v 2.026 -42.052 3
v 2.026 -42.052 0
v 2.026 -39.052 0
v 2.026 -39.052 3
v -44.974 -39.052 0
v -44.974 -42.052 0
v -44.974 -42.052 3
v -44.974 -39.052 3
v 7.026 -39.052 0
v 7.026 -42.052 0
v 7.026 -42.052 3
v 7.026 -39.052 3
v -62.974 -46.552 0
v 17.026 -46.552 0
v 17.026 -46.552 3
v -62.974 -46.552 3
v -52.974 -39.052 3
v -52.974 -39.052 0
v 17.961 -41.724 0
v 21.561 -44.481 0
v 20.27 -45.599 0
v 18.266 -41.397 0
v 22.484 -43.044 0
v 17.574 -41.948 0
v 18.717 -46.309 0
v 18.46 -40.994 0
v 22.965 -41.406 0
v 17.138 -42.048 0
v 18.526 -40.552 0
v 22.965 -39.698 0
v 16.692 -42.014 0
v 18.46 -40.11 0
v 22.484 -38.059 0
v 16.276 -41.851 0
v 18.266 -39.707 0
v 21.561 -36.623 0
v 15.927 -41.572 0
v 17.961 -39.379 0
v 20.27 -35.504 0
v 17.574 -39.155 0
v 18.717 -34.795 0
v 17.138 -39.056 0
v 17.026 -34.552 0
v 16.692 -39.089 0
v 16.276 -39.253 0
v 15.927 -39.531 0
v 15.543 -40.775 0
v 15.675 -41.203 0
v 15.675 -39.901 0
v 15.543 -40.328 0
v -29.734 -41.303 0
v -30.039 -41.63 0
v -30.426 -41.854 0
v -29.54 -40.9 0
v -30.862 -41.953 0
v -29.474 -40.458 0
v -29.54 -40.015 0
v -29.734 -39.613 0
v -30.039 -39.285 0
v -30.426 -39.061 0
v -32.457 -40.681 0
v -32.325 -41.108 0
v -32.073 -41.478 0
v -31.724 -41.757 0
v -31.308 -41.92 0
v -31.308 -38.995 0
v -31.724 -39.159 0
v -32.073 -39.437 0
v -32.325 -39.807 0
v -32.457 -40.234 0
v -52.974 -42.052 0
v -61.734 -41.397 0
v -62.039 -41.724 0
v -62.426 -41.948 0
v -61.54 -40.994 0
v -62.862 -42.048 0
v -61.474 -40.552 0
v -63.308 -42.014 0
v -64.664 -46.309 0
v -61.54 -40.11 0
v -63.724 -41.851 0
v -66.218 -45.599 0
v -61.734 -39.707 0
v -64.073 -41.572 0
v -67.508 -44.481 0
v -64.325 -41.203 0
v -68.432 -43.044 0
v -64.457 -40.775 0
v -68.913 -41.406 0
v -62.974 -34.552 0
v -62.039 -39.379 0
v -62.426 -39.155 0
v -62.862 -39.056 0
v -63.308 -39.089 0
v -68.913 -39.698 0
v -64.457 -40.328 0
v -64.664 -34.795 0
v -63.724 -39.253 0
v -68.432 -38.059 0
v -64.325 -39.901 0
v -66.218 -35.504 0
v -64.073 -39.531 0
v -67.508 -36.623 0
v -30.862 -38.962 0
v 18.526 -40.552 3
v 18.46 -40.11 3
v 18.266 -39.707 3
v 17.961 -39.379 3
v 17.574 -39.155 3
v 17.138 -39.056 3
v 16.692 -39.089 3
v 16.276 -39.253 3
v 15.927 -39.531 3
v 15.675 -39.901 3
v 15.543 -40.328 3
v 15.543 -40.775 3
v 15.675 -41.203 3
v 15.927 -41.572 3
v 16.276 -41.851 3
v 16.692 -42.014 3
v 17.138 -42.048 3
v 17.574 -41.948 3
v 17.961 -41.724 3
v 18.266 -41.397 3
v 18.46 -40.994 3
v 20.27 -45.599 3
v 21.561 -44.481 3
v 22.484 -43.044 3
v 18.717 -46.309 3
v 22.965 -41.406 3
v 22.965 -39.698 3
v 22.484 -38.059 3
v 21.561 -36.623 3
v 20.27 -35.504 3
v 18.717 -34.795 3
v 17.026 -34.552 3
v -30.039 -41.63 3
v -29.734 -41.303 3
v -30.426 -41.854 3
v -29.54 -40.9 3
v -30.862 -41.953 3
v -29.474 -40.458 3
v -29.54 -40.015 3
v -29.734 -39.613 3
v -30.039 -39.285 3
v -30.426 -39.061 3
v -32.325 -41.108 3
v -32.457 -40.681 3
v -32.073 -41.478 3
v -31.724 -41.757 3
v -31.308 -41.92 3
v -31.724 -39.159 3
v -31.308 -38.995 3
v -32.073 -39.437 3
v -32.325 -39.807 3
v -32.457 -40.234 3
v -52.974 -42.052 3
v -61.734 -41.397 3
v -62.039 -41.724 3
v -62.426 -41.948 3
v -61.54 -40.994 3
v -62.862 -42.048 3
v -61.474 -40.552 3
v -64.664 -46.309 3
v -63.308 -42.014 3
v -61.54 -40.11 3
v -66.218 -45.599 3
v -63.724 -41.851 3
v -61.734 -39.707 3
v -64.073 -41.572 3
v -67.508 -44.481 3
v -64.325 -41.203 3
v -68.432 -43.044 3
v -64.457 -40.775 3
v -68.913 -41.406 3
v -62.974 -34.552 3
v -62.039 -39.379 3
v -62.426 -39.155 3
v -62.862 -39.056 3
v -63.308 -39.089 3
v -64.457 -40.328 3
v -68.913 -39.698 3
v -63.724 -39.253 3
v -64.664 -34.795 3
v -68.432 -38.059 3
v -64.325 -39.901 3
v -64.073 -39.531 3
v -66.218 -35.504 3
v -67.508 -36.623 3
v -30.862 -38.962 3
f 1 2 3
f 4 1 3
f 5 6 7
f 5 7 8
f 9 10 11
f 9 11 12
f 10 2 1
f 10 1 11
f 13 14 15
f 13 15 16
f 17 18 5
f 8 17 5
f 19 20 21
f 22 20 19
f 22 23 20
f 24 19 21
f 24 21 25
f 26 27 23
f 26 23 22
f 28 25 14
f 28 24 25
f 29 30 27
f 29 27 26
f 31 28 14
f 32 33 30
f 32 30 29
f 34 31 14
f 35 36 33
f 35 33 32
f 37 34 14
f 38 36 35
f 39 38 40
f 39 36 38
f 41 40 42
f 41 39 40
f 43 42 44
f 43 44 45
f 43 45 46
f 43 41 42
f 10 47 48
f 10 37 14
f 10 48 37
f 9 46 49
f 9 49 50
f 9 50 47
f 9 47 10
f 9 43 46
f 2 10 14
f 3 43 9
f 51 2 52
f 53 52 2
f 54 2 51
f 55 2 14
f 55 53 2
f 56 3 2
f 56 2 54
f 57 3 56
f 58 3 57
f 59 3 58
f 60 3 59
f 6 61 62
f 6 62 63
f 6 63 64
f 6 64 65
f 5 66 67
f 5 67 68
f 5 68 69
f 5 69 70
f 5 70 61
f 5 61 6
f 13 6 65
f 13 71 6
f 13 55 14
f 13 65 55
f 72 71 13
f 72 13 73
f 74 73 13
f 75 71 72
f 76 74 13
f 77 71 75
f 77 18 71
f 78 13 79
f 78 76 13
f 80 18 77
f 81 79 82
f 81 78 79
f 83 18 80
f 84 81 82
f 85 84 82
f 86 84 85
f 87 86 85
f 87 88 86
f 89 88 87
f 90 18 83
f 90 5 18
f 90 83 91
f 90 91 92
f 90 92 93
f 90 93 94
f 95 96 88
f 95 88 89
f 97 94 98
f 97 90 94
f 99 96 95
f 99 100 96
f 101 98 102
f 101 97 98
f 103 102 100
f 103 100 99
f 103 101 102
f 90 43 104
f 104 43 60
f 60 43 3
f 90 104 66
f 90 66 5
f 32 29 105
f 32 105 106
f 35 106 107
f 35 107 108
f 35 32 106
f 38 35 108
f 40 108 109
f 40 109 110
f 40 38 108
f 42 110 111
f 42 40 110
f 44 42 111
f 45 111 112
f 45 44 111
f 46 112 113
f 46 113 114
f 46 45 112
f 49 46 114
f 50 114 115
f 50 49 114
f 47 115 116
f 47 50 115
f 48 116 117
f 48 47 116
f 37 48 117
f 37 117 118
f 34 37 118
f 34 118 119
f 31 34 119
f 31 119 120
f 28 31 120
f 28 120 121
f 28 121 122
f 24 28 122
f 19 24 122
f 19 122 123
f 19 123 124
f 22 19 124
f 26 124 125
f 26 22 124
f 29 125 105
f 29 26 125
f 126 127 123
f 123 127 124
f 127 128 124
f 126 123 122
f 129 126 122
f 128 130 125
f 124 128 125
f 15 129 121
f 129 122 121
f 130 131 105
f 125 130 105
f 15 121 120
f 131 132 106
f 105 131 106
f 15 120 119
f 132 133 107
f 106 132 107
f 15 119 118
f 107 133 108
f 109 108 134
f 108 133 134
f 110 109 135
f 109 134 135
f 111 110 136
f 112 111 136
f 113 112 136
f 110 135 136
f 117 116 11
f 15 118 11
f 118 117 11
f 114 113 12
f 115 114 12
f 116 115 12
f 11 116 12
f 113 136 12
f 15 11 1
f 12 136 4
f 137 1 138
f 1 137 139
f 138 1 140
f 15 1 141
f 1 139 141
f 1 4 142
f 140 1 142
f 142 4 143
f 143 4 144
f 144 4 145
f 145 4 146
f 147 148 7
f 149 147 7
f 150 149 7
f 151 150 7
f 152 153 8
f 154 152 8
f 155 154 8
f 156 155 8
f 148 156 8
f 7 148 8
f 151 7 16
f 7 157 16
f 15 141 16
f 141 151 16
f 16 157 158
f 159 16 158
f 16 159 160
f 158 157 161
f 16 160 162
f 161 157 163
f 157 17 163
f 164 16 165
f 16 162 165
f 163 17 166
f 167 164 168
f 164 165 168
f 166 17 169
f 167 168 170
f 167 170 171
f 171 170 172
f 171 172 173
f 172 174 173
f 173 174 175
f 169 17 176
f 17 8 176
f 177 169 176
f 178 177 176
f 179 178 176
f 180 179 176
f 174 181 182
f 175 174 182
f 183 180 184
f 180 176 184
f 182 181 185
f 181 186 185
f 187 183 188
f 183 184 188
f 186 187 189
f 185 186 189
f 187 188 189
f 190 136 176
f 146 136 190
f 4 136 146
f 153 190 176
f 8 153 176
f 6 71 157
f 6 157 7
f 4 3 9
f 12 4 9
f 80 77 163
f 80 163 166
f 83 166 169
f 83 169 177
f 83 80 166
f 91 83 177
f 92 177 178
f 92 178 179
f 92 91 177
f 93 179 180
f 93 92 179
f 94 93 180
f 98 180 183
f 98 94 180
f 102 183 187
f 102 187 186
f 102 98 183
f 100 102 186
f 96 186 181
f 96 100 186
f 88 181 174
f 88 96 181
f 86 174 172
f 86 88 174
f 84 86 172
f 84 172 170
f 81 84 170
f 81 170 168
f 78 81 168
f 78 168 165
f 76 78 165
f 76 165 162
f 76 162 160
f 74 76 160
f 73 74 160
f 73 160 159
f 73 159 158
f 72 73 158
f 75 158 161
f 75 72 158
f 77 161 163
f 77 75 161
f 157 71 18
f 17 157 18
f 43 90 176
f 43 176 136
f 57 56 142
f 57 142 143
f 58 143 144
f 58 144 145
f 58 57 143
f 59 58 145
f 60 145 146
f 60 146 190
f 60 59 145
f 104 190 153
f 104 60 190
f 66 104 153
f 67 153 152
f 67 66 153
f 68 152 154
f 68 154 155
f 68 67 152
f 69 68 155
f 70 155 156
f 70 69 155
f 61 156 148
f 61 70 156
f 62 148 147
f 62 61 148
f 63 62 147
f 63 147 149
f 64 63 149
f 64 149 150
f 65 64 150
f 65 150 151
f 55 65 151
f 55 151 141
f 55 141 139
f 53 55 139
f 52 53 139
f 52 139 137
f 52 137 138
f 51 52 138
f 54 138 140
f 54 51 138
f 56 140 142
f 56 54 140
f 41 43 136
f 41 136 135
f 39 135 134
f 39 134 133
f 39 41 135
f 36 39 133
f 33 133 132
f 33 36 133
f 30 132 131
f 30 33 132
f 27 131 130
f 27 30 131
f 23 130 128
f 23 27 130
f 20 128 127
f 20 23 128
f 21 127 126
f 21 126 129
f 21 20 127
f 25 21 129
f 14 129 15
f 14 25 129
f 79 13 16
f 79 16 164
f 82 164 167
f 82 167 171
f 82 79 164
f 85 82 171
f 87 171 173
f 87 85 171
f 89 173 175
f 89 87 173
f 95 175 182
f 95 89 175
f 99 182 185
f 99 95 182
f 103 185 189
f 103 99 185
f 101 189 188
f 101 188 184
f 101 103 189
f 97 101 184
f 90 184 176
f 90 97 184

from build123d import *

# Parameters (mm, degrees)
ESQUISSE8_R        = 1.5
ESQUISSE8_W        = 8
ESQUISSE8_H        = 3
ESQUISSE8_W_2      = 5
BOSS_EXTRU_8_DEPTH = 3


with BuildPart() as part:
    # Esquisse8 → Boss.-Extru.8 (new body)
    with BuildSketch(Plane.XY):
        with BuildLine():
            Line((-62.973836854, -34.551748671), (17.026163146, -34.551748671))
            ThreePointArc((17.026163146, -34.551748671), (23.026163146, -40.551748671), (17.026163146, -46.551748671))
            Line((17.026163146, -46.551748671), (-62.973836854, -46.551748671))
            ThreePointArc((-62.973836854, -46.551748671), (-68.973836854, -40.551748671), (-62.973836854, -34.551748671))
        make_face()
        with Locations((-62.973836854, -40.551748671)):
            Circle(ESQUISSE8_R, mode=Mode.SUBTRACT)
        with Locations((-30.973836854, -40.457603156)):
            Circle(ESQUISSE8_R, mode=Mode.SUBTRACT)
        with Locations((17.026163146, -40.551748671)):
            Circle(ESQUISSE8_R, mode=Mode.SUBTRACT)
        with Locations((-48.973836854, -40.551748671)):
            Rectangle(ESQUISSE8_W, ESQUISSE8_H, mode=Mode.SUBTRACT)
        with Locations((4.526163146, -40.551748671)):
            Rectangle(ESQUISSE8_W_2, ESQUISSE8_H, mode=Mode.SUBTRACT)
    extrude(amount=BOSS_EXTRU_8_DEPTH)


solid = part.part
